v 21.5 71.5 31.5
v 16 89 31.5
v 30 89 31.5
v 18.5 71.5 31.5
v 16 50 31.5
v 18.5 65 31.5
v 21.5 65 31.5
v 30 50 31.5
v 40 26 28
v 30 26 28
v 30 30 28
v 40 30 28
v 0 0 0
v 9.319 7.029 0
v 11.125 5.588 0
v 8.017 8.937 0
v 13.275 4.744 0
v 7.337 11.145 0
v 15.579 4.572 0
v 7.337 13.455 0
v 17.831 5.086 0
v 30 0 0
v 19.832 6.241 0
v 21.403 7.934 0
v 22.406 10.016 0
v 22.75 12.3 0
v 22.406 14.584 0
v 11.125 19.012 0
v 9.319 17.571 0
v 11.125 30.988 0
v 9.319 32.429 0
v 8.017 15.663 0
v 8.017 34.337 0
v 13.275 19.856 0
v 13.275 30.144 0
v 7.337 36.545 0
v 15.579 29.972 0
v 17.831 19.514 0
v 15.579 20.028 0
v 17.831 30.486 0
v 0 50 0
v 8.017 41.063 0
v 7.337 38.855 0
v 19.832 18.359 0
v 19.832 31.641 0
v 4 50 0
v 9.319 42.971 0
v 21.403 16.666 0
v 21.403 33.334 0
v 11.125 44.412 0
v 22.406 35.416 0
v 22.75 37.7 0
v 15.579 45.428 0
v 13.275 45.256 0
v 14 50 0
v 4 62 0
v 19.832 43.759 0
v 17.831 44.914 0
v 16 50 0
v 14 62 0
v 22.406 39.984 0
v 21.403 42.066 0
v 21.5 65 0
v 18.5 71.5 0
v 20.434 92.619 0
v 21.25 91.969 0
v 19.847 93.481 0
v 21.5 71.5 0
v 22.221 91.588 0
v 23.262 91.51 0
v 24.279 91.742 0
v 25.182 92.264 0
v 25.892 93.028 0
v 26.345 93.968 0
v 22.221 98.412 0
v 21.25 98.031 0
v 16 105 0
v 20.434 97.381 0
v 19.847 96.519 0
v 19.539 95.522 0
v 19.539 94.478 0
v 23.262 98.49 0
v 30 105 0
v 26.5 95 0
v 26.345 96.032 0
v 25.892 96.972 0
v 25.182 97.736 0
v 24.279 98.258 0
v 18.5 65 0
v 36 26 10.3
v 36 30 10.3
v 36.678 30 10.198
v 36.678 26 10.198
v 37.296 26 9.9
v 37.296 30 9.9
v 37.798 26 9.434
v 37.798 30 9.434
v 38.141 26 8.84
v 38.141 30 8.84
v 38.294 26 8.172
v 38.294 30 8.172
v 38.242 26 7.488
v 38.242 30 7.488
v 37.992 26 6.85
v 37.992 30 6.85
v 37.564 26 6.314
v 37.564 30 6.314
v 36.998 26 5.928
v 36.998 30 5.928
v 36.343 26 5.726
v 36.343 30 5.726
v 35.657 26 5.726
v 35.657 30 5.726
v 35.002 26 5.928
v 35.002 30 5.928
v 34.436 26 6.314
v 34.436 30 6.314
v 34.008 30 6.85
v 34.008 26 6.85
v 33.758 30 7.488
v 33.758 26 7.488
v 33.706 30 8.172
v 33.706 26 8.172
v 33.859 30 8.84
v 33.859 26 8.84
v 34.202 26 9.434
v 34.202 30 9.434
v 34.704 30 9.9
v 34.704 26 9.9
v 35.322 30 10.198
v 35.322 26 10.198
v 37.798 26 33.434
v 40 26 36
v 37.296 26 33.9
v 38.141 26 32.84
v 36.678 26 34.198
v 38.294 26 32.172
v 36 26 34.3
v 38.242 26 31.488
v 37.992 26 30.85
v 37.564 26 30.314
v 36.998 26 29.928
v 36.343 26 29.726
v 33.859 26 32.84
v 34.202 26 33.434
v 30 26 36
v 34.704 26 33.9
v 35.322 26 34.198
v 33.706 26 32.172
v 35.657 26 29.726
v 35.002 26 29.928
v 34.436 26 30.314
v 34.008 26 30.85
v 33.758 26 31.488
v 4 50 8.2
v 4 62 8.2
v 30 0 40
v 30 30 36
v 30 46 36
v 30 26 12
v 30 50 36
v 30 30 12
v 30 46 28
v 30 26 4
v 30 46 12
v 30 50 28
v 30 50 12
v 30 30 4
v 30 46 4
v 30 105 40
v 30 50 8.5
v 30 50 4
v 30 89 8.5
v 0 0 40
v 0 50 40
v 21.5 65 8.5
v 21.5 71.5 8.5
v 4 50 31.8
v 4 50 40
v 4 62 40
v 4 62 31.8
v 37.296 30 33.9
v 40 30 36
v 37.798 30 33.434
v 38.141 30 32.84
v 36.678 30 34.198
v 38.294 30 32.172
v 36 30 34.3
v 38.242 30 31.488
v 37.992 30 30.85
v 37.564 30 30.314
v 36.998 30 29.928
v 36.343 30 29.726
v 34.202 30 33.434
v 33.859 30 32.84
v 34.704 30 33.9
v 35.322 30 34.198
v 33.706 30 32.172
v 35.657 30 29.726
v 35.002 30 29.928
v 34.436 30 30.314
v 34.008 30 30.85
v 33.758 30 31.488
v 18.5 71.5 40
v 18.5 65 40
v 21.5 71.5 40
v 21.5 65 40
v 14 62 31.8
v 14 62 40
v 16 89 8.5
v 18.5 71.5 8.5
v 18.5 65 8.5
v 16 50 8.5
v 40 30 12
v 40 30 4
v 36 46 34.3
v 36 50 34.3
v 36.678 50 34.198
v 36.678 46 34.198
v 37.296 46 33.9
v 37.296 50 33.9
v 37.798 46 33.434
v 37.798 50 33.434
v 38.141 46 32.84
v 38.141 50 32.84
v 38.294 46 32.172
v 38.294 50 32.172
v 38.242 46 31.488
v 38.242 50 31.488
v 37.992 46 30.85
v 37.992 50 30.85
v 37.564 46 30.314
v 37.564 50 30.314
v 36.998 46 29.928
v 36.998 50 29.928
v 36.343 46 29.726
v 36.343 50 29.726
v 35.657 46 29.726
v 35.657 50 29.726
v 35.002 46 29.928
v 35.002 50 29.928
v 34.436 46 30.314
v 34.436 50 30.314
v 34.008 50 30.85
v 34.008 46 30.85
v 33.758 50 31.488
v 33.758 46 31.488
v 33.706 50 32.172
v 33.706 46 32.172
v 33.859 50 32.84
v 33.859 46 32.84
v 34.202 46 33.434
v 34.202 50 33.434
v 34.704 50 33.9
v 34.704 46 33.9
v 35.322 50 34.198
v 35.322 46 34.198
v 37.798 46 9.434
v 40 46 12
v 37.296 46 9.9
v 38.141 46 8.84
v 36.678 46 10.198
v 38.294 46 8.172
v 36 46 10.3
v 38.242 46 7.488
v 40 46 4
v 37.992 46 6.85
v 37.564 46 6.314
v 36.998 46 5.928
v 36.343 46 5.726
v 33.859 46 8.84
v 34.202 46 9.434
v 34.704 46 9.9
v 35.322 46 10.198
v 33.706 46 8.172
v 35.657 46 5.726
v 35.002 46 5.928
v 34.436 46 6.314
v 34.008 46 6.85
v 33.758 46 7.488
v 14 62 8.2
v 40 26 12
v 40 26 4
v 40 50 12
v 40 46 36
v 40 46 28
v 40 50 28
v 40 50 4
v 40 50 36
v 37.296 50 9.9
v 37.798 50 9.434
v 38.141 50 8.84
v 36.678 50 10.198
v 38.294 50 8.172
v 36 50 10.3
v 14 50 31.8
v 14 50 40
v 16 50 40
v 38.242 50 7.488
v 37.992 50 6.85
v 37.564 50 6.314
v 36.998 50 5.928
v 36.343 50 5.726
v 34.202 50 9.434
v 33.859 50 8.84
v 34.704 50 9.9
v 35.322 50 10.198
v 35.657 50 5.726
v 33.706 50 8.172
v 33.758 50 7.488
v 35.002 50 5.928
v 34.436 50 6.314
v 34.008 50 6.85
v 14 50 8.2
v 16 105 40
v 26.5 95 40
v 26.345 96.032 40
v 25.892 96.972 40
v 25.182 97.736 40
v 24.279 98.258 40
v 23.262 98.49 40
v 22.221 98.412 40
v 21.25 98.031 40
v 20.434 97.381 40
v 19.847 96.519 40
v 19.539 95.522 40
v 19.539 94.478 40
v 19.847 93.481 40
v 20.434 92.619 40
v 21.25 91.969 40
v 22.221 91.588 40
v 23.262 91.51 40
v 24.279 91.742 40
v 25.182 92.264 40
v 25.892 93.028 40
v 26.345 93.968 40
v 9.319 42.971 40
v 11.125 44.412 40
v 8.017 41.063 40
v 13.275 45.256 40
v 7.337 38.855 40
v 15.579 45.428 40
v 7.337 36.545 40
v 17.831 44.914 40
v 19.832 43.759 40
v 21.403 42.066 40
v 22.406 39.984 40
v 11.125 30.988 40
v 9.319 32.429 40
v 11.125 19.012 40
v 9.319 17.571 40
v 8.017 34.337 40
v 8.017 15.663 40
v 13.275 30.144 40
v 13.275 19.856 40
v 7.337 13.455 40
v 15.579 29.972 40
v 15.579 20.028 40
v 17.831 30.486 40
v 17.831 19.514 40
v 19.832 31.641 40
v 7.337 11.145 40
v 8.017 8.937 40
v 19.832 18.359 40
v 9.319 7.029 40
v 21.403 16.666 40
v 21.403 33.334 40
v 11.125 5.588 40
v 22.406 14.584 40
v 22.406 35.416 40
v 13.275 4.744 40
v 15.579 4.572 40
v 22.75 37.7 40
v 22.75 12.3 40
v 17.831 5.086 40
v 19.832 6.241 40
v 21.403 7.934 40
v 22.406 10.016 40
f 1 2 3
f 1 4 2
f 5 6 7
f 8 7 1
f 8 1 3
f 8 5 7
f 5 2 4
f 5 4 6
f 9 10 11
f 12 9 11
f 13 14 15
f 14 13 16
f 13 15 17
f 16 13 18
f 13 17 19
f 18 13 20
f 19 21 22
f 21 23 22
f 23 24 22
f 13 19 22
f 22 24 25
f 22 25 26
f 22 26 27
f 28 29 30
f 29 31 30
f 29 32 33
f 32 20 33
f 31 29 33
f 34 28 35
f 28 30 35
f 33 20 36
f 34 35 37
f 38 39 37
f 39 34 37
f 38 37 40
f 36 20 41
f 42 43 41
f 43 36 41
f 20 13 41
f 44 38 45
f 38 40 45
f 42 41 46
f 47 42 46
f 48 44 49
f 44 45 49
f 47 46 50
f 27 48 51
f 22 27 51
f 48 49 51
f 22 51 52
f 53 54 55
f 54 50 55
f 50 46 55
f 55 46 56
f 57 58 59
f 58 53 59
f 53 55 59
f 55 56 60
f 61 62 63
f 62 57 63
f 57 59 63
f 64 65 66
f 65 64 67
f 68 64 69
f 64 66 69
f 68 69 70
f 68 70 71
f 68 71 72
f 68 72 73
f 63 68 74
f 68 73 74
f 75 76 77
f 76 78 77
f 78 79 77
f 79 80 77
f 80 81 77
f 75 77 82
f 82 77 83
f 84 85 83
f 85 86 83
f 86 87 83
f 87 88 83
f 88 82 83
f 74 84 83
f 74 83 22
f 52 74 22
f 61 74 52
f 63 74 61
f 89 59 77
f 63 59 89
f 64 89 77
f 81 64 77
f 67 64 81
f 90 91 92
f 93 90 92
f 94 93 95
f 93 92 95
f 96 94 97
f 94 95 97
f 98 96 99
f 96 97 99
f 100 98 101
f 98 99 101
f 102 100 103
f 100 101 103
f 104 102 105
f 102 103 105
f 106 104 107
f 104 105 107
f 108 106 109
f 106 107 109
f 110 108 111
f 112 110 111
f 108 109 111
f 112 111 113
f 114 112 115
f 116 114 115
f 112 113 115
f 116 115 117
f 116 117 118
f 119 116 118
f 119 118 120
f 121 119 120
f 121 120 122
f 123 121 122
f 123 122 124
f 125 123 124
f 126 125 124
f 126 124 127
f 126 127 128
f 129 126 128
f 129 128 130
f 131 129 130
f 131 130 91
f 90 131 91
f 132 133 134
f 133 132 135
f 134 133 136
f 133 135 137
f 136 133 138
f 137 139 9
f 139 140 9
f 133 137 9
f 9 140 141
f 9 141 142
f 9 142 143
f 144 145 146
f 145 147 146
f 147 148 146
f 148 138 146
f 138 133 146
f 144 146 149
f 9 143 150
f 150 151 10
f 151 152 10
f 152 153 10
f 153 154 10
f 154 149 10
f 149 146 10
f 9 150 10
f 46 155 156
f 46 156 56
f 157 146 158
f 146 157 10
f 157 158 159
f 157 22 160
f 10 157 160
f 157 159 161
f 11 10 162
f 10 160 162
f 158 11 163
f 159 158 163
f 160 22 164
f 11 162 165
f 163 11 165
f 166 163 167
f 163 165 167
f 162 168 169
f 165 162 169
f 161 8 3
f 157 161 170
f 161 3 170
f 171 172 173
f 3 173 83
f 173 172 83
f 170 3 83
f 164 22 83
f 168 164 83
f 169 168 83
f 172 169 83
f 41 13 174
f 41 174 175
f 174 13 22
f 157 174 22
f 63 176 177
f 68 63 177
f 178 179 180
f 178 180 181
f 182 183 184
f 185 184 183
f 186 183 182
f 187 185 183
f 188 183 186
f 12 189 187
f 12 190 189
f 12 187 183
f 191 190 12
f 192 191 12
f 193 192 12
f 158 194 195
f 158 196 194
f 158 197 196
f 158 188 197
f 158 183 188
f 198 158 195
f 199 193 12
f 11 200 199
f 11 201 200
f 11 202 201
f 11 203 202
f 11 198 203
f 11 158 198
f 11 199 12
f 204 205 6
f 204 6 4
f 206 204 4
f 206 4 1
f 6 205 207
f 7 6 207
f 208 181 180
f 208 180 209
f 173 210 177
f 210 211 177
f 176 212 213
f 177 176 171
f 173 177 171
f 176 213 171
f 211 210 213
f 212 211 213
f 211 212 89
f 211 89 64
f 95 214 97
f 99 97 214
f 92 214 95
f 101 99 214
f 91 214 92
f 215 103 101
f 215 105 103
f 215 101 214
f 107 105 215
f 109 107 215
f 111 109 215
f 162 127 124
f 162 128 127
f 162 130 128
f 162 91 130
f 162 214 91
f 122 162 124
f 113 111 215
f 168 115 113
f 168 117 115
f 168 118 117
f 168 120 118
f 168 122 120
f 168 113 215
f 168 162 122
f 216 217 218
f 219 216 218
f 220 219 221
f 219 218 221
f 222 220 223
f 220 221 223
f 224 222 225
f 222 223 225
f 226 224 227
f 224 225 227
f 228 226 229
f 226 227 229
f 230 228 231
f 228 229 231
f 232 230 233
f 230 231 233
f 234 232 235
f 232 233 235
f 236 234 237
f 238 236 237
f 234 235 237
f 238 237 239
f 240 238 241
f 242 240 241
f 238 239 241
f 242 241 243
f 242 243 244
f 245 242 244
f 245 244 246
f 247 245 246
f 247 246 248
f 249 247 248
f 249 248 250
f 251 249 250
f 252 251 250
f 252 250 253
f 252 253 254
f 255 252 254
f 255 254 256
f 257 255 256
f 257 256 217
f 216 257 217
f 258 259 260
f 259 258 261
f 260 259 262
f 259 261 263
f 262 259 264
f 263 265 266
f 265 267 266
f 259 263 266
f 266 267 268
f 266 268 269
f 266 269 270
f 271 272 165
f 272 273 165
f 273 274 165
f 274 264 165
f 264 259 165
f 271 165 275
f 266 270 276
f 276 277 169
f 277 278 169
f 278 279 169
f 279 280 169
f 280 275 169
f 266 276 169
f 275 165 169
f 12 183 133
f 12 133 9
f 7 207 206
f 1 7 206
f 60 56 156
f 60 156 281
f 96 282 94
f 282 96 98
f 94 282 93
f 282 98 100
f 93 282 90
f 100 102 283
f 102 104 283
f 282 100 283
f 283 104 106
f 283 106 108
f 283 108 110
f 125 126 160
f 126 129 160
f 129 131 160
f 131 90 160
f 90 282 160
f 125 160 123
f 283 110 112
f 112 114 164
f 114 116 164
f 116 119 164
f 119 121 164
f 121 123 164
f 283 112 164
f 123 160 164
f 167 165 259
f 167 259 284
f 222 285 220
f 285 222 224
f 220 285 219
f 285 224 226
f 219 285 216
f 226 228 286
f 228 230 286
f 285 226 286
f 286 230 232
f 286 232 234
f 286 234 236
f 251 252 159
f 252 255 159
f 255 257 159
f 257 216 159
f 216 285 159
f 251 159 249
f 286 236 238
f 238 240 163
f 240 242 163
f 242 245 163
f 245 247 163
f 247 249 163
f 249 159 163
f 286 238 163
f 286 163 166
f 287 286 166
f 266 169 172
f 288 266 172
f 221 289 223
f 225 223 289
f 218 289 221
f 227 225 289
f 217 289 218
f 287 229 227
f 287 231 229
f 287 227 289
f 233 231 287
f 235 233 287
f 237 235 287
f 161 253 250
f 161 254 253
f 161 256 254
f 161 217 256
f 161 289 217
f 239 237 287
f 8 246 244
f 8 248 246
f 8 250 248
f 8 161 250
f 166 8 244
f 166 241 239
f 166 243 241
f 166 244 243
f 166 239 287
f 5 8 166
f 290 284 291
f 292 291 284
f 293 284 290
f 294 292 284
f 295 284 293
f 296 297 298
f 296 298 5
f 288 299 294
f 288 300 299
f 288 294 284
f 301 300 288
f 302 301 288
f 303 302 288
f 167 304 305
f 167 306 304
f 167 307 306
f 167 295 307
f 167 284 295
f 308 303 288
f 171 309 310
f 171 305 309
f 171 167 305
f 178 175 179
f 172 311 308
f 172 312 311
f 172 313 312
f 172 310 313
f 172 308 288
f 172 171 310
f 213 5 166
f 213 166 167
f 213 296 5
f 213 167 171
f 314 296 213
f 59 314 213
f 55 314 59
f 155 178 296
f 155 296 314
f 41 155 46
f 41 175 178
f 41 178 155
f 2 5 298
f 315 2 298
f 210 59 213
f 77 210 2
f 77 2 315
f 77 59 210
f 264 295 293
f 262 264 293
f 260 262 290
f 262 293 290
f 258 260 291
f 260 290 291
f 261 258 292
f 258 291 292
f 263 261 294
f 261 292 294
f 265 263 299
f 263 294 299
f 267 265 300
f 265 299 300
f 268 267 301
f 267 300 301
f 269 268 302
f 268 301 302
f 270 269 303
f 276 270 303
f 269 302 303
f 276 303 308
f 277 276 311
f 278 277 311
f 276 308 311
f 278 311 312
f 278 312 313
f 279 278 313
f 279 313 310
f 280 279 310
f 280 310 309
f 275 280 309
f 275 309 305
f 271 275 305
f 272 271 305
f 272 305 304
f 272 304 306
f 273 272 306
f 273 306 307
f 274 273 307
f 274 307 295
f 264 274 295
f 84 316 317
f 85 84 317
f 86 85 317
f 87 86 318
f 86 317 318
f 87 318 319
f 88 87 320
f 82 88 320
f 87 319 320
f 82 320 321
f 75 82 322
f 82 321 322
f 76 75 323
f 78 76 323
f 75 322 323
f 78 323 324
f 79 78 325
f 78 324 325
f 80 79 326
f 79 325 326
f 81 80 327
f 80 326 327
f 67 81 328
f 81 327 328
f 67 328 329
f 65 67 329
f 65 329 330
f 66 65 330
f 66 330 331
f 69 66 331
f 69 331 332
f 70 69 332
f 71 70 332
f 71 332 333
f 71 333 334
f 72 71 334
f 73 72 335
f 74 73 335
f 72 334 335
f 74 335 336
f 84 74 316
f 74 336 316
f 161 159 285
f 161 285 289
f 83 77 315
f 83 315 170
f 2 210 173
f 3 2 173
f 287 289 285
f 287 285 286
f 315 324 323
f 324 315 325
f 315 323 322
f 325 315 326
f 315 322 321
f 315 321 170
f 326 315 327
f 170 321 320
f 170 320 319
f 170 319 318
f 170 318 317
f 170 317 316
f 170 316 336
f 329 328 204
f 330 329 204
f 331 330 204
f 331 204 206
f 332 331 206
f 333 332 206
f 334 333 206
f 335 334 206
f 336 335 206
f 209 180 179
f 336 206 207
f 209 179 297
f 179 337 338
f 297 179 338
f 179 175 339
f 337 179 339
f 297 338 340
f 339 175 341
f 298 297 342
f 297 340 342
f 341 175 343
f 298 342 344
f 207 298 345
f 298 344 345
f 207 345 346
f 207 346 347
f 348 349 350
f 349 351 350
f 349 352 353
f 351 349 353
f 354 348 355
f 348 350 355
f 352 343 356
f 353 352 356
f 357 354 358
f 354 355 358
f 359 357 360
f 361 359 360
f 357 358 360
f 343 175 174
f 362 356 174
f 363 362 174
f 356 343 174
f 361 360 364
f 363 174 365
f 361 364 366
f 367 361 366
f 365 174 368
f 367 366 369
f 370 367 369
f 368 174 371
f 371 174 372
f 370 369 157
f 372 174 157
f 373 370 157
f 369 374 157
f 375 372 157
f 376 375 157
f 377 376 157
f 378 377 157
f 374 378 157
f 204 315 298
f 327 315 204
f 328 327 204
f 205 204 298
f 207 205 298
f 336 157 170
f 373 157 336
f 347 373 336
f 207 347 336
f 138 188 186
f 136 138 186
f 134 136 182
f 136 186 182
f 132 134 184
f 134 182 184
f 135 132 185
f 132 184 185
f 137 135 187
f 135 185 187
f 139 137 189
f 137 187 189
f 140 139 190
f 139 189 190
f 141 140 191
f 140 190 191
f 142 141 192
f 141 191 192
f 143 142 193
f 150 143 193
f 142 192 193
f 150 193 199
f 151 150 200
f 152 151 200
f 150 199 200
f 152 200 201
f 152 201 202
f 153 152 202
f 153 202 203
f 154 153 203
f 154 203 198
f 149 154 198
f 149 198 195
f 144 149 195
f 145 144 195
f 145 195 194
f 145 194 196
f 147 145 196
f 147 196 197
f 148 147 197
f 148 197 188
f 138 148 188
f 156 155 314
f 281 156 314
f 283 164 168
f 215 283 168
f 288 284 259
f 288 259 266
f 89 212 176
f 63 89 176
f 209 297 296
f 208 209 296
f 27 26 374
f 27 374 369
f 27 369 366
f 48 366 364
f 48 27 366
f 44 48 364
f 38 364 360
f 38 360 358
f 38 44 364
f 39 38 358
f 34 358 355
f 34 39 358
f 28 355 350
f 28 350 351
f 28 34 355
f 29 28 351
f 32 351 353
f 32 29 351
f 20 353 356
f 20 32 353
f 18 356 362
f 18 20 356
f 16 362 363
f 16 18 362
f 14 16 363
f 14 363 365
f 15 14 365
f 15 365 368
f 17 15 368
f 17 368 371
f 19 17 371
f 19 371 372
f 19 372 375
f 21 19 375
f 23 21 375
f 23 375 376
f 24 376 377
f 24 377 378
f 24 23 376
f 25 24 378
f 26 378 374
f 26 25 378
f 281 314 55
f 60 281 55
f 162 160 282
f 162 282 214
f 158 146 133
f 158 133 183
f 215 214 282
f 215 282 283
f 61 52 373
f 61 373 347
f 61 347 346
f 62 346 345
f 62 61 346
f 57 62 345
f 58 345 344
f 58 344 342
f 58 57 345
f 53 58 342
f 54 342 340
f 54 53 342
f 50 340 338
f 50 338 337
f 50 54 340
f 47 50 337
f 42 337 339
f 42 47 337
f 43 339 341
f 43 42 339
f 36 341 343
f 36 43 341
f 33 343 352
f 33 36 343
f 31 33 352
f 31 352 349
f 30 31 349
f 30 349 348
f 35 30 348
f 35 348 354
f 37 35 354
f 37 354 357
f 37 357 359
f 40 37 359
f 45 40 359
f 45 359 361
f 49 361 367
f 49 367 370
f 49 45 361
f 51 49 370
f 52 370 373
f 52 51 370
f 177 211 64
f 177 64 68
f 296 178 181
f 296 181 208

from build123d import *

# Parameters (mm, degrees)
ESQUISSE1_W              = 30
ESQUISSE1_H              = 50
BOSS_EXTRU_1_DEPTH       = 40
BOSS_EXTRU_3_START       = -40
BOSS_EXTRU_3_OUTLINE_R   = 7.75
BOSS_EXTRU_3_DEPTH       = 40
ESQUISSE138_W            = 14
ESQUISSE138_H            = 8.5
BOSS_EXTRU_4_DEPTH       = 55
ESQUISSE145_W            = 8
ESQUISSE145_H            = 4
BOSS_EXTRU_5_DEPTH       = 10
ESQUISSE146_R            = 2.3
ENL_V_MAT_EXTRU_13_DEPTH = 39
ESQUISSE147_W            = 3
ESQUISSE147_H            = 6.5
ENL_V_MAT_EXTRU_14_DEPTH = 40
ESQUISSE150_W            = 10
ESQUISSE150_H            = 8.2
BOSS_EXTRU_6_DEPTH       = 12
ESQUISSE154_W            = 14
ESQUISSE154_H            = 16
BOSS_EXTRU_7_DEPTH       = 23
ESQUISSE152_R            = 3.5
ENL_V_MAT_EXTRU_16_DEPTH = 40


# Read off the part's stored shape, not the designer's step: Boss.-Extru.3
with BuildPart() as part:
    # Esquisse1 → Boss.-Extru.1 (new body)
    with BuildSketch(Plane.XY):
        with Locations((15, 25)):
            Rectangle(ESQUISSE1_W, ESQUISSE1_H)
    extrude(amount=BOSS_EXTRU_1_DEPTH)

    # Boss.-Extru.3 outline → Boss.-Extru.3 (cut)
    with BuildSketch(Plane.XY.offset(40).offset(BOSS_EXTRU_3_START)):
        with Locations((15, 12.3)):
            Circle(BOSS_EXTRU_3_OUTLINE_R)
        with Locations((15, 37.7)):
            Circle(BOSS_EXTRU_3_OUTLINE_R)
    extrude(amount=BOSS_EXTRU_3_DEPTH, mode=Mode.SUBTRACT)

    # Esquisse138 → Boss.-Extru.4 (add)
    with BuildSketch(Plane(origin=(0, 50, 0), x_dir=(1, 0, 0), z_dir=(0, 1, 0))):
        with Locations((23, -35.75)):
            Rectangle(ESQUISSE138_W, ESQUISSE138_H)
        with Locations((23, -4.25)):
            Rectangle(ESQUISSE138_W, ESQUISSE138_H)
    extrude(amount=BOSS_EXTRU_4_DEPTH)

    # Esquisse145 → Boss.-Extru.5 (add)
    with BuildSketch(Plane(origin=(30, 0, 0), x_dir=(0, 0, -1), z_dir=(1, 0, 0))):
        with Locations((-32, 48)):
            Rectangle(ESQUISSE145_W, ESQUISSE145_H)
        with Locations((-8, 48)):
            Rectangle(ESQUISSE145_W, ESQUISSE145_H)
        with Locations((-32, 28)):
            Rectangle(ESQUISSE145_W, ESQUISSE145_H)
        with Locations((-8, 28)):
            Rectangle(ESQUISSE145_W, ESQUISSE145_H)
    extrude(amount=BOSS_EXTRU_5_DEPTH)

    # Esquisse146 → Enlèv. mat.-Extru.13 (cut)
    with BuildSketch(Plane(origin=(0, 50, 0), x_dir=(1, 0, 0), z_dir=(0, 1, 0))):
        with Locations(Location((36, -32, 0), (0, 0, 270))):
            Circle(ESQUISSE146_R)
        with Locations(Location((36, -8, 0), (0, 0, 270))):
            Circle(ESQUISSE146_R)
    extrude(amount=-ENL_V_MAT_EXTRU_13_DEPTH, mode=Mode.SUBTRACT)

    # Esquisse147 → Enlèv. mat.-Extru.14 (cut)
    with BuildSketch(Plane.XY.offset(40)):
        with Locations((20, 68.25)):
            Rectangle(ESQUISSE147_W, ESQUISSE147_H)
    extrude(amount=-ENL_V_MAT_EXTRU_14_DEPTH, mode=Mode.SUBTRACT)

    # Esquisse150 → Boss.-Extru.6 (add)
    with BuildSketch(Plane(origin=(0, 50, 0), x_dir=(1, 0, 0), z_dir=(0, 1, 0))):
        with Locations((9, -4.1)):
            Rectangle(ESQUISSE150_W, ESQUISSE150_H)
        with Locations((9, -35.9)):
            Rectangle(ESQUISSE150_W, ESQUISSE150_H)
    extrude(amount=BOSS_EXTRU_6_DEPTH)

    # Esquisse154 → Boss.-Extru.7 (add)
    with BuildSketch(Plane.XY.offset(8.5)):
        with Locations((23, 97)):
            Rectangle(ESQUISSE154_W, ESQUISSE154_H)
    extrude(amount=BOSS_EXTRU_7_DEPTH)

    # Esquisse152 → Enlèv. mat.-Extru.16 (cut)
    with BuildSketch(Plane.XY.offset(40)):
        with Locations((23, 95)):
            Circle(ESQUISSE152_R)
    extrude(amount=-ENL_V_MAT_EXTRU_16_DEPTH, mode=Mode.SUBTRACT)


solid = part.part
